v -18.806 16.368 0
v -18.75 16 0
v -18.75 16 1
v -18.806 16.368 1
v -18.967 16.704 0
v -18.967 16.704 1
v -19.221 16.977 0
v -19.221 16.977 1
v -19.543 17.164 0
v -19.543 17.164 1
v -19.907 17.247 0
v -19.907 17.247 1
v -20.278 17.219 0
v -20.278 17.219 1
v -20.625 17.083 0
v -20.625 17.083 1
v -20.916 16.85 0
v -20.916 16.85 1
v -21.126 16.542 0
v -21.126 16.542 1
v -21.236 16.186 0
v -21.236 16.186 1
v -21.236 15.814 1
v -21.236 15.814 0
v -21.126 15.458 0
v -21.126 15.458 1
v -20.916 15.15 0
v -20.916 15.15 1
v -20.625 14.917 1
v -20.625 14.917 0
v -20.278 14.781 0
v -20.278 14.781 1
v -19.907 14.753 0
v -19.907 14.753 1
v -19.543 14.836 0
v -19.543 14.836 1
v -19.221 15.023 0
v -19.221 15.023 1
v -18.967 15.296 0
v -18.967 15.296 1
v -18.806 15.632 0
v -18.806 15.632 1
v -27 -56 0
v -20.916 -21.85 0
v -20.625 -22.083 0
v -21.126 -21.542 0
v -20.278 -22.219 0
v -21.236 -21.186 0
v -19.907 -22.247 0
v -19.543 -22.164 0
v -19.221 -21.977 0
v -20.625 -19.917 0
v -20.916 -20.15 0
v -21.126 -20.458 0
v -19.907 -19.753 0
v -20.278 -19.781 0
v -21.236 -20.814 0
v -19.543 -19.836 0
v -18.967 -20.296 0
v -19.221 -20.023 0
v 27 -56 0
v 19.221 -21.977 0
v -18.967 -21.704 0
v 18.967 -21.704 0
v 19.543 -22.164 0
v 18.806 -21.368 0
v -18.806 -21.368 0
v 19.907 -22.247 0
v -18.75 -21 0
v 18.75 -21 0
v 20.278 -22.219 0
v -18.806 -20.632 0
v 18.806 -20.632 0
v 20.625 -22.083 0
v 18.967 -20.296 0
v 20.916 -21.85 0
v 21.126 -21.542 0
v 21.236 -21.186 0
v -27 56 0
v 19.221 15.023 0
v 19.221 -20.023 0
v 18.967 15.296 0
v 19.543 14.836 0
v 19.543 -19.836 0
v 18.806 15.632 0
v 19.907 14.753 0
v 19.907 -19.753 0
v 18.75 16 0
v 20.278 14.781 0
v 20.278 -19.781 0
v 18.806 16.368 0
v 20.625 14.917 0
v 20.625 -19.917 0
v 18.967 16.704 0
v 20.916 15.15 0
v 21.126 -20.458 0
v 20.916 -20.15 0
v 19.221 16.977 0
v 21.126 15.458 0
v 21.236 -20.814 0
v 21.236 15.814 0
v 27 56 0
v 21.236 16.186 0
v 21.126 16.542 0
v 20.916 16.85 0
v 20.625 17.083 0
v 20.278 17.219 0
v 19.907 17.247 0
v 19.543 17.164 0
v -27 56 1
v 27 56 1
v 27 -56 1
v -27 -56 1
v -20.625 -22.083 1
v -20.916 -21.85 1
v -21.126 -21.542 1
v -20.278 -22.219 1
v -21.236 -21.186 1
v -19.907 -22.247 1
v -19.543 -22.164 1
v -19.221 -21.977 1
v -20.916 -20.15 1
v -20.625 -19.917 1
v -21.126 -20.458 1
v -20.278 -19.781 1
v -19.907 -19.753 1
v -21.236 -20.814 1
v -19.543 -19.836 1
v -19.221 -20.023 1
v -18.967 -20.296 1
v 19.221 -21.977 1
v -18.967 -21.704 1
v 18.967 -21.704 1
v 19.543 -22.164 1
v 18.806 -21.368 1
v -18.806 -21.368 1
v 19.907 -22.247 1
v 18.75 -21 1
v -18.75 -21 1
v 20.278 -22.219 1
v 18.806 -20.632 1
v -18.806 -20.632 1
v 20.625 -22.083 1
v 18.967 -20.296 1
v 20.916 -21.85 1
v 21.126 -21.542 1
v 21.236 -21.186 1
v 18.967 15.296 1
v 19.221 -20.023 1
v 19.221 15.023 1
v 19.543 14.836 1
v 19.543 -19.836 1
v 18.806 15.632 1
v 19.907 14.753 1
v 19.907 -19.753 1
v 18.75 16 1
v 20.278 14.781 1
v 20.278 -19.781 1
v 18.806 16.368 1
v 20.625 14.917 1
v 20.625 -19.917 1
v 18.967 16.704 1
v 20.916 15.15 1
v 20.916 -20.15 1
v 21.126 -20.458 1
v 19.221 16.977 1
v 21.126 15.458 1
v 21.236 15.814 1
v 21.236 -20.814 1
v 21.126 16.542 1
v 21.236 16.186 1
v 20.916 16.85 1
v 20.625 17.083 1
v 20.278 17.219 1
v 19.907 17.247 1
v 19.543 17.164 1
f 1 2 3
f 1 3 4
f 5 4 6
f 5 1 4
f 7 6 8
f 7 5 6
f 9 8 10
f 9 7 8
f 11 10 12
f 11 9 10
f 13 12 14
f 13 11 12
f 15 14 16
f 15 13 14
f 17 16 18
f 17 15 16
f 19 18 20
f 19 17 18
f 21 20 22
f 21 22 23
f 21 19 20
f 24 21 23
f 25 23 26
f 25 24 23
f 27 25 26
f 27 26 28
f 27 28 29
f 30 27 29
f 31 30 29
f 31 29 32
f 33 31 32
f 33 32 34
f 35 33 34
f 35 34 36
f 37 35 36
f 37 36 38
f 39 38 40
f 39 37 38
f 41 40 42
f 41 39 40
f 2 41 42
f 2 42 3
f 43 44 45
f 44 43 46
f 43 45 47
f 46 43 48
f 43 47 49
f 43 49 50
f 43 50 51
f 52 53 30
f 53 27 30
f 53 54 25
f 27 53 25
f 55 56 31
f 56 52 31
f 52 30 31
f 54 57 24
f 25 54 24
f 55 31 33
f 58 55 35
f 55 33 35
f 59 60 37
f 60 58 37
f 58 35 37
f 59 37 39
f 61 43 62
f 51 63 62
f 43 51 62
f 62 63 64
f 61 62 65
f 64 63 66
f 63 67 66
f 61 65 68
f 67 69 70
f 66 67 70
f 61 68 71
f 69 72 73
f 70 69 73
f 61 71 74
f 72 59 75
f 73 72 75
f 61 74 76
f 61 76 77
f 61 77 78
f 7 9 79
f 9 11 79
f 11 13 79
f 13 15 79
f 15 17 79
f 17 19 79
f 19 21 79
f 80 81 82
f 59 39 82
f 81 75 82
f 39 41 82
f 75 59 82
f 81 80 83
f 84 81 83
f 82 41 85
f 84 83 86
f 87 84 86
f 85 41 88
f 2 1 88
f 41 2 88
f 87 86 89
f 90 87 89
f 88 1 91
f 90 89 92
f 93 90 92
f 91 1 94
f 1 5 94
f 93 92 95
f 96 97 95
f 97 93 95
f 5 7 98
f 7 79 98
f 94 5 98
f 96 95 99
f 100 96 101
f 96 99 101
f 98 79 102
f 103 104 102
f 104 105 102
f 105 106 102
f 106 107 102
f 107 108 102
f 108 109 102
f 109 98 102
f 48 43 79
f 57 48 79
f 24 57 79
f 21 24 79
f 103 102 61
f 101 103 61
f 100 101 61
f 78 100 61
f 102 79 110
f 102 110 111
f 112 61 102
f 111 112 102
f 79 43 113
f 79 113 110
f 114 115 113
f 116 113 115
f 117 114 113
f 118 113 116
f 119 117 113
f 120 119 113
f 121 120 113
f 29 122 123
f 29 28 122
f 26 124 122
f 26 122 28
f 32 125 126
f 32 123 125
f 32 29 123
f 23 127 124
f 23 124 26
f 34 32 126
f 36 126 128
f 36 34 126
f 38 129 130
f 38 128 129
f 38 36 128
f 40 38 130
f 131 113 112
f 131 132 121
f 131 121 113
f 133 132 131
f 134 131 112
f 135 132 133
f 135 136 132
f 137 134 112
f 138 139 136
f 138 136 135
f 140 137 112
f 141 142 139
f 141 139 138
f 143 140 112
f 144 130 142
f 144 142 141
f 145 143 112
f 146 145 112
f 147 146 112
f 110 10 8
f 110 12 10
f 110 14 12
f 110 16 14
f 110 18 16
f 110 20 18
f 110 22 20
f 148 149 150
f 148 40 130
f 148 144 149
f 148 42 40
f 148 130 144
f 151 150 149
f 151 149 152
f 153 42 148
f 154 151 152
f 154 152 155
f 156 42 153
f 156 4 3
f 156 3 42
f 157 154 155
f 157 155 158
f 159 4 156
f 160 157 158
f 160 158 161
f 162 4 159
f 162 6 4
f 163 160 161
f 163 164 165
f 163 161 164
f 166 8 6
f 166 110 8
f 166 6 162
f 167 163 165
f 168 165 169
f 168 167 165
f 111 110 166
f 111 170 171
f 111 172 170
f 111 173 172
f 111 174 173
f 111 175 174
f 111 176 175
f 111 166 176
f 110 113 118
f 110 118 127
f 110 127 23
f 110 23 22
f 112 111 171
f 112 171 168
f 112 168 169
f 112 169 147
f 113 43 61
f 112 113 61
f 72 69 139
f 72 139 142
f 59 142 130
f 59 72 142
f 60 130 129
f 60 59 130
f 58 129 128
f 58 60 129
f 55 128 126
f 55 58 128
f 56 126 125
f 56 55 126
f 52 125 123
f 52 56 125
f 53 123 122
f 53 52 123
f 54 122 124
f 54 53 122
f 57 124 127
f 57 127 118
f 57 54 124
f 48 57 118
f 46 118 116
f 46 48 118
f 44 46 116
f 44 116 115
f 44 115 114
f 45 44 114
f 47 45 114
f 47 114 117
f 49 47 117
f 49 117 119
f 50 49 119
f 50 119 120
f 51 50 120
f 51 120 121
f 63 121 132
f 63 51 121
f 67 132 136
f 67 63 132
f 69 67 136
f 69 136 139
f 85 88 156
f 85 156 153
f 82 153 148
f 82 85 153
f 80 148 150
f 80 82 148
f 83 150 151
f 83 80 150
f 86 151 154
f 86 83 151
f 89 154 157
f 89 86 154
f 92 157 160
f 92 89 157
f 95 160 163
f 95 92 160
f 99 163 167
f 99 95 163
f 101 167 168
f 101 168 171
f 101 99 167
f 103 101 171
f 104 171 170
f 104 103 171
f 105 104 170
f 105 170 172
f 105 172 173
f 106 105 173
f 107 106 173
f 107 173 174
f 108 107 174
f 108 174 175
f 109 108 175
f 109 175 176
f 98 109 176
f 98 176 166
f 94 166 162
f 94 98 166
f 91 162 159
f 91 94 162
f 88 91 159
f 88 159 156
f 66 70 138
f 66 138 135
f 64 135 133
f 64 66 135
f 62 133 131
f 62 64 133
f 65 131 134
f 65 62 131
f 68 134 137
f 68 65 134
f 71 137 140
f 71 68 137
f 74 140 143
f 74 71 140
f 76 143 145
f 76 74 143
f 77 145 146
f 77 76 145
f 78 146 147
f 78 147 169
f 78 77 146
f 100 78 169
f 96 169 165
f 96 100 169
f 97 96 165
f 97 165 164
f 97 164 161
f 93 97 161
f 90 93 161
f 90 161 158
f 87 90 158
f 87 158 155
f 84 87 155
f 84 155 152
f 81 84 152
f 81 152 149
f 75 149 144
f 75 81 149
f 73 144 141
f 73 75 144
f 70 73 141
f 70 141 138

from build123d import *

# Parameters (mm, degrees)
SKETCH_1_W      = 54
SKETCH_1_H      = 112
SKETCH_1_R      = 1.25
EXTRUDE_1_DEPTH = 1


with BuildPart() as part:
    # 草图1 → 凸台-拉伸1 (new body)
    with BuildSketch(Plane.XY):
        Rectangle(SKETCH_1_W, SKETCH_1_H)
        with Locations((-20, 16)):
            Circle(SKETCH_1_R, mode=Mode.SUBTRACT)
        with Locations((-20, -21)):
            Circle(SKETCH_1_R, mode=Mode.SUBTRACT)
        with Locations(Location((20, -21, 0), (0, 0, 180))):
            Circle(SKETCH_1_R, mode=Mode.SUBTRACT)
        with Locations(Location((20, 16, 0), (0, 0, 180))):
            Circle(SKETCH_1_R, mode=Mode.SUBTRACT)
    extrude(amount=EXTRUDE_1_DEPTH)


solid = part.part
